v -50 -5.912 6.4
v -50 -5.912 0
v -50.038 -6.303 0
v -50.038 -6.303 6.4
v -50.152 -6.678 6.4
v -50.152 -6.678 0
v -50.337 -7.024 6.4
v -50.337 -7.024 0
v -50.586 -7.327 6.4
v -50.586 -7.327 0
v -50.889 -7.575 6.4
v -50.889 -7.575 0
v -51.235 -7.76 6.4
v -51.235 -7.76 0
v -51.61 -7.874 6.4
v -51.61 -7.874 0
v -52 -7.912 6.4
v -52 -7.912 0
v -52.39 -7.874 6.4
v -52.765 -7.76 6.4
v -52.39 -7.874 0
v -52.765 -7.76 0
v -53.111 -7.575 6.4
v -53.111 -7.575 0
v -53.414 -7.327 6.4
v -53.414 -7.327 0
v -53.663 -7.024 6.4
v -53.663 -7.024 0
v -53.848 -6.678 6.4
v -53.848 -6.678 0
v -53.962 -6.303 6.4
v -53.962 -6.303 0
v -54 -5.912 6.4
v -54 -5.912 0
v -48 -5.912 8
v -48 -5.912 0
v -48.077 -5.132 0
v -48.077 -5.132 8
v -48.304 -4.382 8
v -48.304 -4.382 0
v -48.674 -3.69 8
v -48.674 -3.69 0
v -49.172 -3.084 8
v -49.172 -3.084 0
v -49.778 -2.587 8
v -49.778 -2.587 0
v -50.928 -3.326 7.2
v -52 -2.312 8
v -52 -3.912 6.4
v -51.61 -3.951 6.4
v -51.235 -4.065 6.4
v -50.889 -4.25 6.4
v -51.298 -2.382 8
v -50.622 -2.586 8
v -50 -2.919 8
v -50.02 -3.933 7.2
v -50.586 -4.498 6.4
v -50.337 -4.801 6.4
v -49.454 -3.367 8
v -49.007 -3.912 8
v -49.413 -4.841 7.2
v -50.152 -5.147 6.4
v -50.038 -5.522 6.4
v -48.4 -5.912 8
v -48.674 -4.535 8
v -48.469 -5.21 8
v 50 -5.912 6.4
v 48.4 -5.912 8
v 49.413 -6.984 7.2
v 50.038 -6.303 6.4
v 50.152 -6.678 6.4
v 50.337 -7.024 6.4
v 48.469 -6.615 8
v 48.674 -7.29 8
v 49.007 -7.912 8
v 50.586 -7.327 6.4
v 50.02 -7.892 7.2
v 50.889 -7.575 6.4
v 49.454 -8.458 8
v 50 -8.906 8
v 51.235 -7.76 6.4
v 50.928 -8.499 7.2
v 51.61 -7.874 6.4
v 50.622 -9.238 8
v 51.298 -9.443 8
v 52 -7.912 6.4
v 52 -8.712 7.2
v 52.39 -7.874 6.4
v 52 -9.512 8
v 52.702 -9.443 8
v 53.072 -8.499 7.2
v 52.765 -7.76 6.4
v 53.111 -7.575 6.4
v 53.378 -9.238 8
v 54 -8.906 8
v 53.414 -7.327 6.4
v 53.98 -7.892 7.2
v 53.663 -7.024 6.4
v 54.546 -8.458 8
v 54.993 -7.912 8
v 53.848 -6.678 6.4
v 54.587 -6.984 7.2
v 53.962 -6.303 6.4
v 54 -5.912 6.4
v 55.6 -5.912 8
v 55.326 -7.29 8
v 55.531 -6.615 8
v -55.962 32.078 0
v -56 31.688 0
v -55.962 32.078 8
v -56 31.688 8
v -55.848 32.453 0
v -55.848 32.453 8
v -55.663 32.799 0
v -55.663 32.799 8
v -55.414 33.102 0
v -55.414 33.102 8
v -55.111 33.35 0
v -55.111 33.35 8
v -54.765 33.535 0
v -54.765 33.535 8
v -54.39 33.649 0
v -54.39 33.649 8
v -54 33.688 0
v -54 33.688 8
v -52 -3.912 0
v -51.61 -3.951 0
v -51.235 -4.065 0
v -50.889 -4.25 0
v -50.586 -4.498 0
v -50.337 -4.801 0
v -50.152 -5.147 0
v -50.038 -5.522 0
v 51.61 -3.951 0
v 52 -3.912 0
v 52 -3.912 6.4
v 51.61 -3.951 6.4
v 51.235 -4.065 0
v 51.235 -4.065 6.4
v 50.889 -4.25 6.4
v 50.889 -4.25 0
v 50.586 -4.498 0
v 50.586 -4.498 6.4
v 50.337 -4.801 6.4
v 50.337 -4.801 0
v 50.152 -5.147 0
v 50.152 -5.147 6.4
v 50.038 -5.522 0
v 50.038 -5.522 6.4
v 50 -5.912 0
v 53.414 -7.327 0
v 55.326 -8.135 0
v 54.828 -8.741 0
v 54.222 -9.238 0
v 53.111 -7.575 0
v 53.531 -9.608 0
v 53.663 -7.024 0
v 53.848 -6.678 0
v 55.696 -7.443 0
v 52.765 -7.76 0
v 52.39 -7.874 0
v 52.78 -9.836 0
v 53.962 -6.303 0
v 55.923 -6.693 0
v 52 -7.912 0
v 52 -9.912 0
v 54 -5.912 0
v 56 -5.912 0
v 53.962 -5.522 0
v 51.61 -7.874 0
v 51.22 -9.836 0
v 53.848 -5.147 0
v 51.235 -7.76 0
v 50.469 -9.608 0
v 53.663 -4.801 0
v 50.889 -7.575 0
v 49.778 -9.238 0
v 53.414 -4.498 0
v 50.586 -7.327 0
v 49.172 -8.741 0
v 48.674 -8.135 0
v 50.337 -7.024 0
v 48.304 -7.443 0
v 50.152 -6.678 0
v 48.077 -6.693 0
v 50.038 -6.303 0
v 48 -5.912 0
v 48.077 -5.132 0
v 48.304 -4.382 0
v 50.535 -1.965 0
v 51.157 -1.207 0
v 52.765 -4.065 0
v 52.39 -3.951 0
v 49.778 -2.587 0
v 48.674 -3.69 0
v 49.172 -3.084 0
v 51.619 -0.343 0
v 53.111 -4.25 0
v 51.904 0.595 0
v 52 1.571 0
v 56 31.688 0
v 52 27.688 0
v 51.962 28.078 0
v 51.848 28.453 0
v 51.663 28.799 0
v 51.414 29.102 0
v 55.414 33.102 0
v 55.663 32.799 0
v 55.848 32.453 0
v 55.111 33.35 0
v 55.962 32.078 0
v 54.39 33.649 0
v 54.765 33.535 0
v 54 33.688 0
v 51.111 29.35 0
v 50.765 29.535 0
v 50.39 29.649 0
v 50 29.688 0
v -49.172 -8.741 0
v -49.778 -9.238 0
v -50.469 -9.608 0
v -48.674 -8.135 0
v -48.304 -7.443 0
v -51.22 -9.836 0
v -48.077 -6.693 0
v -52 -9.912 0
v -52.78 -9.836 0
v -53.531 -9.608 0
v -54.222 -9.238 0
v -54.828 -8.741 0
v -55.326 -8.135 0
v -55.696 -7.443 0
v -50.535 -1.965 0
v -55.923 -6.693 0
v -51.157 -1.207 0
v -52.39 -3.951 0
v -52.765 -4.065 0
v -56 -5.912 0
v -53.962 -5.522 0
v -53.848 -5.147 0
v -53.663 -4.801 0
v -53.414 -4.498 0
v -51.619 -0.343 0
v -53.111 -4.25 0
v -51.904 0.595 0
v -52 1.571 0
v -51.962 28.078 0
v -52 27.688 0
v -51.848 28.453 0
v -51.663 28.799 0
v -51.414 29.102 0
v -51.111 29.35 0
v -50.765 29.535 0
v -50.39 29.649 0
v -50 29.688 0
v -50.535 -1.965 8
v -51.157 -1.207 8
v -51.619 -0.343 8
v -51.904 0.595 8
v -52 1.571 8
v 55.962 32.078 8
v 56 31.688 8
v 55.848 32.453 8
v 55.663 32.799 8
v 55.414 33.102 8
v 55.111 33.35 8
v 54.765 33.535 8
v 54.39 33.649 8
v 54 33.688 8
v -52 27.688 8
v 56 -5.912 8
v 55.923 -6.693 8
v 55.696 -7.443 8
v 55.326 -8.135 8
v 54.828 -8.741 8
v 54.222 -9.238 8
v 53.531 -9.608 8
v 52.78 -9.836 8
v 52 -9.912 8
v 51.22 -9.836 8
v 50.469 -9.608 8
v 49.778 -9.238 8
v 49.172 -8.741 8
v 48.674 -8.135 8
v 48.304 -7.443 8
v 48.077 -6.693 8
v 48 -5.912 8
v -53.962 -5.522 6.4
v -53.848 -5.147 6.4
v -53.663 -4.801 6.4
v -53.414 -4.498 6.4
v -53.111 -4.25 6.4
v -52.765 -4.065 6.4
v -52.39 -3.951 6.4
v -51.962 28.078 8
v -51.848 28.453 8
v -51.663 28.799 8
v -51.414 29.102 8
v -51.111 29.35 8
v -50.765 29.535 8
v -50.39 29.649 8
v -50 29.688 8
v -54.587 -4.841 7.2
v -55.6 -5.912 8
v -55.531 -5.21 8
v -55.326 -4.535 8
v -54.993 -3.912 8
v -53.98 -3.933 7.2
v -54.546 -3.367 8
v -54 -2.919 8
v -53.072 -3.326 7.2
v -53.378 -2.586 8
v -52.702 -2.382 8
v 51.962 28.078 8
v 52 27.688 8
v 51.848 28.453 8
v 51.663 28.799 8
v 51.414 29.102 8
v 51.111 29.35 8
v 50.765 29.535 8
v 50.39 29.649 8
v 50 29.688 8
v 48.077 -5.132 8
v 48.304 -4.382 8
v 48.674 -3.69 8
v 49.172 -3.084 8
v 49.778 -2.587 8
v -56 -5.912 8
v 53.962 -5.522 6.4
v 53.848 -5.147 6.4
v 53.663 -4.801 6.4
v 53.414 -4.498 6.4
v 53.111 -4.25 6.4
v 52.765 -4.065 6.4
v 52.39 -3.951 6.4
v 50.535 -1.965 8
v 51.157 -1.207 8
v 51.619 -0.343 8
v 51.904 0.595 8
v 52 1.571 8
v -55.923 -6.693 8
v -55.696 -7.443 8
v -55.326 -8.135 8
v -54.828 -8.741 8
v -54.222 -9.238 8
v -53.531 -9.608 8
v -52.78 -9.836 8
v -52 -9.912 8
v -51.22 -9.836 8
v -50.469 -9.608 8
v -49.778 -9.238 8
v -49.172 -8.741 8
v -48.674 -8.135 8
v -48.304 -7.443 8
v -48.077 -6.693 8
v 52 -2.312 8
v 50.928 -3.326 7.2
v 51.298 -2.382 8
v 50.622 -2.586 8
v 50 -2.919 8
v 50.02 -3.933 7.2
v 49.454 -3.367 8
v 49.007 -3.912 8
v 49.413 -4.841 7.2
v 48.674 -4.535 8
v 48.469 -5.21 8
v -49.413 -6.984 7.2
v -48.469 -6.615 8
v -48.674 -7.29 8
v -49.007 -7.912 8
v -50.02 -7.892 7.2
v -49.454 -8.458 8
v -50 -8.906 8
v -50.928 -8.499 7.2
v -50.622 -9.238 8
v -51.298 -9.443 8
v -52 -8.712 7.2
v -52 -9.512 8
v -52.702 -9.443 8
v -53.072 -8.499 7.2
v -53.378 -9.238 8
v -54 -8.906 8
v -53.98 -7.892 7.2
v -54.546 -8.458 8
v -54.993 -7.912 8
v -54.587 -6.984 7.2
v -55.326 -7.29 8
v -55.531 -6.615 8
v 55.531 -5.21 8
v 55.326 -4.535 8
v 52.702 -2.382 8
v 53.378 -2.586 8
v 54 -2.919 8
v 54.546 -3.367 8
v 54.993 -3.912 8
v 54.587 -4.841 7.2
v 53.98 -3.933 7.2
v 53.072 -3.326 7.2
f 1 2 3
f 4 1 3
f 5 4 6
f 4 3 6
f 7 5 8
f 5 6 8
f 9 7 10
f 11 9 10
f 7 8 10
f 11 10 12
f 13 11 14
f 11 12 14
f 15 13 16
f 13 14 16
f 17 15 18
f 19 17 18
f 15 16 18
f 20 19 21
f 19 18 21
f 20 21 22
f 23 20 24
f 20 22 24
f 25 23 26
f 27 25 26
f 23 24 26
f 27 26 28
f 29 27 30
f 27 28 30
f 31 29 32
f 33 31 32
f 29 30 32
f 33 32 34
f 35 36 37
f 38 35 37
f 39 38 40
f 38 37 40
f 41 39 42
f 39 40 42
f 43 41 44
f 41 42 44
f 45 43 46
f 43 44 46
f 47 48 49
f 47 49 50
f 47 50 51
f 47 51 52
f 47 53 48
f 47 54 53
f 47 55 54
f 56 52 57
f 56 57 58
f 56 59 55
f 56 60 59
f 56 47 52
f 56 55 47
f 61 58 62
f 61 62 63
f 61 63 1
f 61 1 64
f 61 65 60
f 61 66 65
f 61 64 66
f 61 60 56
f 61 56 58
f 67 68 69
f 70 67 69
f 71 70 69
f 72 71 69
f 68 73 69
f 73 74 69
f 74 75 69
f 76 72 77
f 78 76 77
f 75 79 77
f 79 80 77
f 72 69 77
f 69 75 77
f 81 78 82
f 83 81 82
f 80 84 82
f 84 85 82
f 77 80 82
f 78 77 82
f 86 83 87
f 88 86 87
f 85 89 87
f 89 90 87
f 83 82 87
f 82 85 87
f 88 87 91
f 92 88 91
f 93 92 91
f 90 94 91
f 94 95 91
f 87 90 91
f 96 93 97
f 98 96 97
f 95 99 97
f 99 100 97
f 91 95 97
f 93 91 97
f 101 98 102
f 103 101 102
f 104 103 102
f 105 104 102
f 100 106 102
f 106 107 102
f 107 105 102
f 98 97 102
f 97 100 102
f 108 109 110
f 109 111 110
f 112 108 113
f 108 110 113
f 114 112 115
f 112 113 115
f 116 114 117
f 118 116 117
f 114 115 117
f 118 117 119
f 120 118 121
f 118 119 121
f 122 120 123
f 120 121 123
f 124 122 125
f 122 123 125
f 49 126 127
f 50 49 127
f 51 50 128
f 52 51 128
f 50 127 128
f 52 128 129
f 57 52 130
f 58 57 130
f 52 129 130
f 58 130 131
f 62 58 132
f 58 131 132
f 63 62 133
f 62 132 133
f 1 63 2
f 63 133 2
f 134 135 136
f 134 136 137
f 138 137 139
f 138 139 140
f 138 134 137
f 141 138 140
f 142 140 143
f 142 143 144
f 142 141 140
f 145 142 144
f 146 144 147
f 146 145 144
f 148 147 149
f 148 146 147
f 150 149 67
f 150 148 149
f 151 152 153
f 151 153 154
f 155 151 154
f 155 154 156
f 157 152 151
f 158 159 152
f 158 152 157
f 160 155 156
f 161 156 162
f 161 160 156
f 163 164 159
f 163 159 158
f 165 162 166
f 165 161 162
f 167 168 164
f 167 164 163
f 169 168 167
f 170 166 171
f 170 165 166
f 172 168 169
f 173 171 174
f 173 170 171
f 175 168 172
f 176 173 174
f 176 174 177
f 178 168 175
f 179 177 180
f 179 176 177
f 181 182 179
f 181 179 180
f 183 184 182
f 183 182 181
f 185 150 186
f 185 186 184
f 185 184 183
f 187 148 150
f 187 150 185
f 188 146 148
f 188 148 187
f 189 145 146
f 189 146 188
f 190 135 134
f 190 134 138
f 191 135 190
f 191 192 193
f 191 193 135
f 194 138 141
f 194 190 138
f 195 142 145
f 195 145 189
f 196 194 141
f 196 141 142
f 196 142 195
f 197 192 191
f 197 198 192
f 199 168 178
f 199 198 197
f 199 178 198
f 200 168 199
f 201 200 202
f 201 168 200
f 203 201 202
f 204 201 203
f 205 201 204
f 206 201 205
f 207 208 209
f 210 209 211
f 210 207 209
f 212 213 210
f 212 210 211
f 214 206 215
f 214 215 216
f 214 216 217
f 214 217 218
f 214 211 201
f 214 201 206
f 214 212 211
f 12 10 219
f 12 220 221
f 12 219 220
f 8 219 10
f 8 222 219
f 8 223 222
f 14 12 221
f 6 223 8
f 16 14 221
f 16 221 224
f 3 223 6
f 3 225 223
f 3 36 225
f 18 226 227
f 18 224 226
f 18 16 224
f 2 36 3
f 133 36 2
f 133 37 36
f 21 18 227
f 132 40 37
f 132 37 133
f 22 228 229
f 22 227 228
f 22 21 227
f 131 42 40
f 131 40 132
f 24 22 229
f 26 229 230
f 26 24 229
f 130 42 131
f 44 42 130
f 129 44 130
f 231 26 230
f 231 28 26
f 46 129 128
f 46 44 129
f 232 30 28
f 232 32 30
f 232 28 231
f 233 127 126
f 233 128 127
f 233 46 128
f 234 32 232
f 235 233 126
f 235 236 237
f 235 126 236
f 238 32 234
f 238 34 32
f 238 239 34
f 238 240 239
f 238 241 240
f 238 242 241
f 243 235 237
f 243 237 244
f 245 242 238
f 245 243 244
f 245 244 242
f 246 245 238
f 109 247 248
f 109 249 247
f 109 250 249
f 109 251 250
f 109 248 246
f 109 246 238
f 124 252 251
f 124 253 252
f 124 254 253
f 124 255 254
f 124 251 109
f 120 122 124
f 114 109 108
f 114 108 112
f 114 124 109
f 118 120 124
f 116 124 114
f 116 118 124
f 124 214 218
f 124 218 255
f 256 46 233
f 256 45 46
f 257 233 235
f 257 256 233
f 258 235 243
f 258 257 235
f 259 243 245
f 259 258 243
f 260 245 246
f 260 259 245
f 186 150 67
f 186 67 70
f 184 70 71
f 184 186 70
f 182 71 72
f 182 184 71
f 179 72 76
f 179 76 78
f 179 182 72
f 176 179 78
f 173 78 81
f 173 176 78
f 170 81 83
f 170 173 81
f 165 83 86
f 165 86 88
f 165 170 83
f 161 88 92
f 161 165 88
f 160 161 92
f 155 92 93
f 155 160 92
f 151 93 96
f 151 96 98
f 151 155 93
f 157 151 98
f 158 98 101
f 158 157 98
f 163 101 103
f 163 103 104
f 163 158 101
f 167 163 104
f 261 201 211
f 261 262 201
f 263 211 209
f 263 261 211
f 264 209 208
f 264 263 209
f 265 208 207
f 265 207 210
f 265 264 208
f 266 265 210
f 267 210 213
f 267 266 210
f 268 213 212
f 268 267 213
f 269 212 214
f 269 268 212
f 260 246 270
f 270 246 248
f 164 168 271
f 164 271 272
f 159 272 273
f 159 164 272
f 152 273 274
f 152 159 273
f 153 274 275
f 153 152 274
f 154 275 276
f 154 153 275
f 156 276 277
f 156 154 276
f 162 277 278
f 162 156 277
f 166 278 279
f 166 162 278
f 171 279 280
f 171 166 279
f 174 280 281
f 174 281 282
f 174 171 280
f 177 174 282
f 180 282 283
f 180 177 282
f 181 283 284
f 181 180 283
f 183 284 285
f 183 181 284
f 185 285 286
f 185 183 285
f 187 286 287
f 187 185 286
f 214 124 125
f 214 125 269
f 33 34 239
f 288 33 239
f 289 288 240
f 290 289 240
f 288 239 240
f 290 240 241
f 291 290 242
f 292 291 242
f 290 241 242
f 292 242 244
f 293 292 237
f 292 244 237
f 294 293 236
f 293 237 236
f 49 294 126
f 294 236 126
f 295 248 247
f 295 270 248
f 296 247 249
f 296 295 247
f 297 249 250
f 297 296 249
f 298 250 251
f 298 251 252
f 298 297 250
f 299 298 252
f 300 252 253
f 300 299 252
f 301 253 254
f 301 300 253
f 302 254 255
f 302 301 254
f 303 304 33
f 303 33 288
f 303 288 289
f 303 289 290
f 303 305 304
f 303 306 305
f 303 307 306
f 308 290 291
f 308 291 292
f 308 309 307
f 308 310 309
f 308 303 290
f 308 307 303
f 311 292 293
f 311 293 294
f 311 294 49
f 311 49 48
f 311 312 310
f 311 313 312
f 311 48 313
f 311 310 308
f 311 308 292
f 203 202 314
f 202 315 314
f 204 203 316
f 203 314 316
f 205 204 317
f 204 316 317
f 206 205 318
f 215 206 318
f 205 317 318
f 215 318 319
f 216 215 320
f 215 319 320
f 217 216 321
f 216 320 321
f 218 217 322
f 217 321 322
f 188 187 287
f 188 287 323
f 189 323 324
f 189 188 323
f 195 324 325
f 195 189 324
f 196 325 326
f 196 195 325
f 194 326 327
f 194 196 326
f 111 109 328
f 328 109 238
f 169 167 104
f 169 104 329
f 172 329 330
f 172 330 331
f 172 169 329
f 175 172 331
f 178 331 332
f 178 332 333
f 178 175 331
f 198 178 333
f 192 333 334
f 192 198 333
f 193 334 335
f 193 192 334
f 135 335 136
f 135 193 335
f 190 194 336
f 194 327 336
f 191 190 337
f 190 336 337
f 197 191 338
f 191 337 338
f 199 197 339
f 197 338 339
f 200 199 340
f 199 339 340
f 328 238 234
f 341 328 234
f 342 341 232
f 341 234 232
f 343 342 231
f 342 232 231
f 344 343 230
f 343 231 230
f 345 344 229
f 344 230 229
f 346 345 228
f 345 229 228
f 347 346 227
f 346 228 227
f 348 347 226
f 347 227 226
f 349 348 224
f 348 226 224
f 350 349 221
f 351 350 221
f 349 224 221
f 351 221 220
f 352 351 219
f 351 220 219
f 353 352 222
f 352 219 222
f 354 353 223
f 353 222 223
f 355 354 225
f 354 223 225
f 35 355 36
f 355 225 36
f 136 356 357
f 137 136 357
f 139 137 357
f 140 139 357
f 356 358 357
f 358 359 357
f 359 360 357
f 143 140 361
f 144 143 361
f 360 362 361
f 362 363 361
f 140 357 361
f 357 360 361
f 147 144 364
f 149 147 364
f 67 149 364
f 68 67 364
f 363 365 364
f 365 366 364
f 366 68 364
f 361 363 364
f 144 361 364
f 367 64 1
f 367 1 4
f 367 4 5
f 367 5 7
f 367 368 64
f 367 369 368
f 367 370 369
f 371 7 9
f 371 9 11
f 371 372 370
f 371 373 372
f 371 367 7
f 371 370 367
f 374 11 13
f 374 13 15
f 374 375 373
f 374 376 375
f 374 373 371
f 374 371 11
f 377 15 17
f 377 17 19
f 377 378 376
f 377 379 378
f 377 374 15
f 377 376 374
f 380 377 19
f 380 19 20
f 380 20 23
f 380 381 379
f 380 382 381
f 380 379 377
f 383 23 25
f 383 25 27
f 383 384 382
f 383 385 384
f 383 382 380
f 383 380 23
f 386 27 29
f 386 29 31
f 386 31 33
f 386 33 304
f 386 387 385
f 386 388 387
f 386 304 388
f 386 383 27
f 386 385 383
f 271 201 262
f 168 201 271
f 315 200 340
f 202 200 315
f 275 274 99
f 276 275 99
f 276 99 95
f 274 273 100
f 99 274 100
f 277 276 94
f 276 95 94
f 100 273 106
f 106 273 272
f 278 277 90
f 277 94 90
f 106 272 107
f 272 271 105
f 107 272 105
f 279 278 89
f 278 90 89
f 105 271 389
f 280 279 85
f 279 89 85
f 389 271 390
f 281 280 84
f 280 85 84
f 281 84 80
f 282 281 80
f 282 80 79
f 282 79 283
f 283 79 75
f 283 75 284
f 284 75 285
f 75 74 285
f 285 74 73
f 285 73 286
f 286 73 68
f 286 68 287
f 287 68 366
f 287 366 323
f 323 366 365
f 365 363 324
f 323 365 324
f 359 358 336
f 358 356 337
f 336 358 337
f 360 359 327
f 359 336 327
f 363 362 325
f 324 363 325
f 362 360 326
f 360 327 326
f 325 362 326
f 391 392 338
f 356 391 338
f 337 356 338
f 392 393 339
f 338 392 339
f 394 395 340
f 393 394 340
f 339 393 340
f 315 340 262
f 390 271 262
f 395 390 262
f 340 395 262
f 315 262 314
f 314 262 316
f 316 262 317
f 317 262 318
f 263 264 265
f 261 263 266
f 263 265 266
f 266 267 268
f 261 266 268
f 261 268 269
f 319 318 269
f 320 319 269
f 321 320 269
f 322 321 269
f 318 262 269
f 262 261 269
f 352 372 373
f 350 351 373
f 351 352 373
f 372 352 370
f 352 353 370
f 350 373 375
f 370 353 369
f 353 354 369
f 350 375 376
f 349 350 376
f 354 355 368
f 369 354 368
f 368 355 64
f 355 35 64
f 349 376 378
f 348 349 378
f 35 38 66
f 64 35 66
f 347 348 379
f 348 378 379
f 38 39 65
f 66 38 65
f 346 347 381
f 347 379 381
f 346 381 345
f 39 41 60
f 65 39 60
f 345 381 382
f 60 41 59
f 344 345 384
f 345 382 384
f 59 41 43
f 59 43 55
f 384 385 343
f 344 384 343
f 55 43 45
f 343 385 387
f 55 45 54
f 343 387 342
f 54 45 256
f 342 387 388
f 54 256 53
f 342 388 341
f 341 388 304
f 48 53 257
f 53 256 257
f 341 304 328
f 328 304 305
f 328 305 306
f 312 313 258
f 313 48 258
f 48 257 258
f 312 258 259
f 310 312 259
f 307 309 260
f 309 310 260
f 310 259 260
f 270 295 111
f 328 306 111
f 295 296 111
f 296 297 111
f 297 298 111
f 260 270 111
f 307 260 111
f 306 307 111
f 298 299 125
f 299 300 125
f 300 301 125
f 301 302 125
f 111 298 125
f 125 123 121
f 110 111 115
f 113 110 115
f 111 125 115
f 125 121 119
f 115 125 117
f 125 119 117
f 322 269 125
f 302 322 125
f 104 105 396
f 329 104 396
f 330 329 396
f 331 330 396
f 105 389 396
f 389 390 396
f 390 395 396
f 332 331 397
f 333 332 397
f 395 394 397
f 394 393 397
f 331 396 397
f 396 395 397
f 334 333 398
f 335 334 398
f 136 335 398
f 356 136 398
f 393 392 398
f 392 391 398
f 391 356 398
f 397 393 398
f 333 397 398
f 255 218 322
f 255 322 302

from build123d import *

# Parameters (mm, degrees)
F1_DEPTH = 8
F2_R     = 5
F3_R     = 2
F4_SIZE  = 1.6


with BuildPart() as f1:
    # F0 (on Top) → F1 (new body)
    with BuildSketch(Plane.XY):
        with BuildLine():
            Line((-52, 29.6875580251), (0, 29.6875580251))
            Line((0, 29.6875580251), (0, 33.6875580251))
            Line((0, 33.6875580251), (-56, 33.6875580251))
            Line((-56, 33.6875580251), (-56, -5.9124419749))
            ThreePointArc((-56, -5.9124419749), (-54.8284271247, -3.0840148501), (-52, -1.9124419749))
            Line((-52, -1.9124419749), (-52, 29.6875580251))
        make_face()
        with BuildLine():
            Line((-52, -3.9124419749), (-52, -1.9124419749))
            ThreePointArc((-52, -1.9124419749), (-54.8284271247, -3.0840148501), (-56, -5.9124419749))
            Line((-56, -5.9124419749), (-54, -5.9124419749))
            ThreePointArc((-54, -5.9124419749), (-53.4142135624, -4.4982284125), (-52, -3.9124419749))
        make_face()
        with BuildLine():
            ThreePointArc((-48, -5.9124419749), (-49.1715728753, -3.0840148501), (-52, -1.9124419749))
            Line((-52, -1.9124419749), (-52, -3.9124419749))
            ThreePointArc((-52, -3.9124419749), (-50.5857864376, -4.4982284125), (-50, -5.9124419749))
            ThreePointArc((-50, -5.9124419749), (-52, -7.9124419749), (-54, -5.9124419749))
            Line((-54, -5.9124419749), (-56, -5.9124419749))
            ThreePointArc((-56, -5.9124419749), (-52, -9.9124419749), (-48, -5.9124419749))
        make_face()
    extrude(amount=F1_DEPTH)

    # F2
    f2_edges = [f1.edges().sort_by_distance(p)[0] for p in [
        (-52, -1.912442, 4),
    ]]
    fillet(f2_edges, radius=F2_R)

    # F3
    f3_edges = [f1.edges().sort_by_distance(p)[0] for p in [
        (-52, 29.687558, 4),
        (-56, 33.687558, 4),
    ]]
    fillet(f3_edges, radius=F3_R)

    # F4
    f4_edges = [f1.edges().sort_by_distance(p)[0] for p in [
        (-52, -7.912442, 8),
    ]]
    chamfer(f4_edges, length=F4_SIZE)

    # F5: F1 across plane


with BuildPart() as f1_1:
    add(f1.part)
    add(f1.part.mirror(Plane.YZ))


solid = f1_1.part
